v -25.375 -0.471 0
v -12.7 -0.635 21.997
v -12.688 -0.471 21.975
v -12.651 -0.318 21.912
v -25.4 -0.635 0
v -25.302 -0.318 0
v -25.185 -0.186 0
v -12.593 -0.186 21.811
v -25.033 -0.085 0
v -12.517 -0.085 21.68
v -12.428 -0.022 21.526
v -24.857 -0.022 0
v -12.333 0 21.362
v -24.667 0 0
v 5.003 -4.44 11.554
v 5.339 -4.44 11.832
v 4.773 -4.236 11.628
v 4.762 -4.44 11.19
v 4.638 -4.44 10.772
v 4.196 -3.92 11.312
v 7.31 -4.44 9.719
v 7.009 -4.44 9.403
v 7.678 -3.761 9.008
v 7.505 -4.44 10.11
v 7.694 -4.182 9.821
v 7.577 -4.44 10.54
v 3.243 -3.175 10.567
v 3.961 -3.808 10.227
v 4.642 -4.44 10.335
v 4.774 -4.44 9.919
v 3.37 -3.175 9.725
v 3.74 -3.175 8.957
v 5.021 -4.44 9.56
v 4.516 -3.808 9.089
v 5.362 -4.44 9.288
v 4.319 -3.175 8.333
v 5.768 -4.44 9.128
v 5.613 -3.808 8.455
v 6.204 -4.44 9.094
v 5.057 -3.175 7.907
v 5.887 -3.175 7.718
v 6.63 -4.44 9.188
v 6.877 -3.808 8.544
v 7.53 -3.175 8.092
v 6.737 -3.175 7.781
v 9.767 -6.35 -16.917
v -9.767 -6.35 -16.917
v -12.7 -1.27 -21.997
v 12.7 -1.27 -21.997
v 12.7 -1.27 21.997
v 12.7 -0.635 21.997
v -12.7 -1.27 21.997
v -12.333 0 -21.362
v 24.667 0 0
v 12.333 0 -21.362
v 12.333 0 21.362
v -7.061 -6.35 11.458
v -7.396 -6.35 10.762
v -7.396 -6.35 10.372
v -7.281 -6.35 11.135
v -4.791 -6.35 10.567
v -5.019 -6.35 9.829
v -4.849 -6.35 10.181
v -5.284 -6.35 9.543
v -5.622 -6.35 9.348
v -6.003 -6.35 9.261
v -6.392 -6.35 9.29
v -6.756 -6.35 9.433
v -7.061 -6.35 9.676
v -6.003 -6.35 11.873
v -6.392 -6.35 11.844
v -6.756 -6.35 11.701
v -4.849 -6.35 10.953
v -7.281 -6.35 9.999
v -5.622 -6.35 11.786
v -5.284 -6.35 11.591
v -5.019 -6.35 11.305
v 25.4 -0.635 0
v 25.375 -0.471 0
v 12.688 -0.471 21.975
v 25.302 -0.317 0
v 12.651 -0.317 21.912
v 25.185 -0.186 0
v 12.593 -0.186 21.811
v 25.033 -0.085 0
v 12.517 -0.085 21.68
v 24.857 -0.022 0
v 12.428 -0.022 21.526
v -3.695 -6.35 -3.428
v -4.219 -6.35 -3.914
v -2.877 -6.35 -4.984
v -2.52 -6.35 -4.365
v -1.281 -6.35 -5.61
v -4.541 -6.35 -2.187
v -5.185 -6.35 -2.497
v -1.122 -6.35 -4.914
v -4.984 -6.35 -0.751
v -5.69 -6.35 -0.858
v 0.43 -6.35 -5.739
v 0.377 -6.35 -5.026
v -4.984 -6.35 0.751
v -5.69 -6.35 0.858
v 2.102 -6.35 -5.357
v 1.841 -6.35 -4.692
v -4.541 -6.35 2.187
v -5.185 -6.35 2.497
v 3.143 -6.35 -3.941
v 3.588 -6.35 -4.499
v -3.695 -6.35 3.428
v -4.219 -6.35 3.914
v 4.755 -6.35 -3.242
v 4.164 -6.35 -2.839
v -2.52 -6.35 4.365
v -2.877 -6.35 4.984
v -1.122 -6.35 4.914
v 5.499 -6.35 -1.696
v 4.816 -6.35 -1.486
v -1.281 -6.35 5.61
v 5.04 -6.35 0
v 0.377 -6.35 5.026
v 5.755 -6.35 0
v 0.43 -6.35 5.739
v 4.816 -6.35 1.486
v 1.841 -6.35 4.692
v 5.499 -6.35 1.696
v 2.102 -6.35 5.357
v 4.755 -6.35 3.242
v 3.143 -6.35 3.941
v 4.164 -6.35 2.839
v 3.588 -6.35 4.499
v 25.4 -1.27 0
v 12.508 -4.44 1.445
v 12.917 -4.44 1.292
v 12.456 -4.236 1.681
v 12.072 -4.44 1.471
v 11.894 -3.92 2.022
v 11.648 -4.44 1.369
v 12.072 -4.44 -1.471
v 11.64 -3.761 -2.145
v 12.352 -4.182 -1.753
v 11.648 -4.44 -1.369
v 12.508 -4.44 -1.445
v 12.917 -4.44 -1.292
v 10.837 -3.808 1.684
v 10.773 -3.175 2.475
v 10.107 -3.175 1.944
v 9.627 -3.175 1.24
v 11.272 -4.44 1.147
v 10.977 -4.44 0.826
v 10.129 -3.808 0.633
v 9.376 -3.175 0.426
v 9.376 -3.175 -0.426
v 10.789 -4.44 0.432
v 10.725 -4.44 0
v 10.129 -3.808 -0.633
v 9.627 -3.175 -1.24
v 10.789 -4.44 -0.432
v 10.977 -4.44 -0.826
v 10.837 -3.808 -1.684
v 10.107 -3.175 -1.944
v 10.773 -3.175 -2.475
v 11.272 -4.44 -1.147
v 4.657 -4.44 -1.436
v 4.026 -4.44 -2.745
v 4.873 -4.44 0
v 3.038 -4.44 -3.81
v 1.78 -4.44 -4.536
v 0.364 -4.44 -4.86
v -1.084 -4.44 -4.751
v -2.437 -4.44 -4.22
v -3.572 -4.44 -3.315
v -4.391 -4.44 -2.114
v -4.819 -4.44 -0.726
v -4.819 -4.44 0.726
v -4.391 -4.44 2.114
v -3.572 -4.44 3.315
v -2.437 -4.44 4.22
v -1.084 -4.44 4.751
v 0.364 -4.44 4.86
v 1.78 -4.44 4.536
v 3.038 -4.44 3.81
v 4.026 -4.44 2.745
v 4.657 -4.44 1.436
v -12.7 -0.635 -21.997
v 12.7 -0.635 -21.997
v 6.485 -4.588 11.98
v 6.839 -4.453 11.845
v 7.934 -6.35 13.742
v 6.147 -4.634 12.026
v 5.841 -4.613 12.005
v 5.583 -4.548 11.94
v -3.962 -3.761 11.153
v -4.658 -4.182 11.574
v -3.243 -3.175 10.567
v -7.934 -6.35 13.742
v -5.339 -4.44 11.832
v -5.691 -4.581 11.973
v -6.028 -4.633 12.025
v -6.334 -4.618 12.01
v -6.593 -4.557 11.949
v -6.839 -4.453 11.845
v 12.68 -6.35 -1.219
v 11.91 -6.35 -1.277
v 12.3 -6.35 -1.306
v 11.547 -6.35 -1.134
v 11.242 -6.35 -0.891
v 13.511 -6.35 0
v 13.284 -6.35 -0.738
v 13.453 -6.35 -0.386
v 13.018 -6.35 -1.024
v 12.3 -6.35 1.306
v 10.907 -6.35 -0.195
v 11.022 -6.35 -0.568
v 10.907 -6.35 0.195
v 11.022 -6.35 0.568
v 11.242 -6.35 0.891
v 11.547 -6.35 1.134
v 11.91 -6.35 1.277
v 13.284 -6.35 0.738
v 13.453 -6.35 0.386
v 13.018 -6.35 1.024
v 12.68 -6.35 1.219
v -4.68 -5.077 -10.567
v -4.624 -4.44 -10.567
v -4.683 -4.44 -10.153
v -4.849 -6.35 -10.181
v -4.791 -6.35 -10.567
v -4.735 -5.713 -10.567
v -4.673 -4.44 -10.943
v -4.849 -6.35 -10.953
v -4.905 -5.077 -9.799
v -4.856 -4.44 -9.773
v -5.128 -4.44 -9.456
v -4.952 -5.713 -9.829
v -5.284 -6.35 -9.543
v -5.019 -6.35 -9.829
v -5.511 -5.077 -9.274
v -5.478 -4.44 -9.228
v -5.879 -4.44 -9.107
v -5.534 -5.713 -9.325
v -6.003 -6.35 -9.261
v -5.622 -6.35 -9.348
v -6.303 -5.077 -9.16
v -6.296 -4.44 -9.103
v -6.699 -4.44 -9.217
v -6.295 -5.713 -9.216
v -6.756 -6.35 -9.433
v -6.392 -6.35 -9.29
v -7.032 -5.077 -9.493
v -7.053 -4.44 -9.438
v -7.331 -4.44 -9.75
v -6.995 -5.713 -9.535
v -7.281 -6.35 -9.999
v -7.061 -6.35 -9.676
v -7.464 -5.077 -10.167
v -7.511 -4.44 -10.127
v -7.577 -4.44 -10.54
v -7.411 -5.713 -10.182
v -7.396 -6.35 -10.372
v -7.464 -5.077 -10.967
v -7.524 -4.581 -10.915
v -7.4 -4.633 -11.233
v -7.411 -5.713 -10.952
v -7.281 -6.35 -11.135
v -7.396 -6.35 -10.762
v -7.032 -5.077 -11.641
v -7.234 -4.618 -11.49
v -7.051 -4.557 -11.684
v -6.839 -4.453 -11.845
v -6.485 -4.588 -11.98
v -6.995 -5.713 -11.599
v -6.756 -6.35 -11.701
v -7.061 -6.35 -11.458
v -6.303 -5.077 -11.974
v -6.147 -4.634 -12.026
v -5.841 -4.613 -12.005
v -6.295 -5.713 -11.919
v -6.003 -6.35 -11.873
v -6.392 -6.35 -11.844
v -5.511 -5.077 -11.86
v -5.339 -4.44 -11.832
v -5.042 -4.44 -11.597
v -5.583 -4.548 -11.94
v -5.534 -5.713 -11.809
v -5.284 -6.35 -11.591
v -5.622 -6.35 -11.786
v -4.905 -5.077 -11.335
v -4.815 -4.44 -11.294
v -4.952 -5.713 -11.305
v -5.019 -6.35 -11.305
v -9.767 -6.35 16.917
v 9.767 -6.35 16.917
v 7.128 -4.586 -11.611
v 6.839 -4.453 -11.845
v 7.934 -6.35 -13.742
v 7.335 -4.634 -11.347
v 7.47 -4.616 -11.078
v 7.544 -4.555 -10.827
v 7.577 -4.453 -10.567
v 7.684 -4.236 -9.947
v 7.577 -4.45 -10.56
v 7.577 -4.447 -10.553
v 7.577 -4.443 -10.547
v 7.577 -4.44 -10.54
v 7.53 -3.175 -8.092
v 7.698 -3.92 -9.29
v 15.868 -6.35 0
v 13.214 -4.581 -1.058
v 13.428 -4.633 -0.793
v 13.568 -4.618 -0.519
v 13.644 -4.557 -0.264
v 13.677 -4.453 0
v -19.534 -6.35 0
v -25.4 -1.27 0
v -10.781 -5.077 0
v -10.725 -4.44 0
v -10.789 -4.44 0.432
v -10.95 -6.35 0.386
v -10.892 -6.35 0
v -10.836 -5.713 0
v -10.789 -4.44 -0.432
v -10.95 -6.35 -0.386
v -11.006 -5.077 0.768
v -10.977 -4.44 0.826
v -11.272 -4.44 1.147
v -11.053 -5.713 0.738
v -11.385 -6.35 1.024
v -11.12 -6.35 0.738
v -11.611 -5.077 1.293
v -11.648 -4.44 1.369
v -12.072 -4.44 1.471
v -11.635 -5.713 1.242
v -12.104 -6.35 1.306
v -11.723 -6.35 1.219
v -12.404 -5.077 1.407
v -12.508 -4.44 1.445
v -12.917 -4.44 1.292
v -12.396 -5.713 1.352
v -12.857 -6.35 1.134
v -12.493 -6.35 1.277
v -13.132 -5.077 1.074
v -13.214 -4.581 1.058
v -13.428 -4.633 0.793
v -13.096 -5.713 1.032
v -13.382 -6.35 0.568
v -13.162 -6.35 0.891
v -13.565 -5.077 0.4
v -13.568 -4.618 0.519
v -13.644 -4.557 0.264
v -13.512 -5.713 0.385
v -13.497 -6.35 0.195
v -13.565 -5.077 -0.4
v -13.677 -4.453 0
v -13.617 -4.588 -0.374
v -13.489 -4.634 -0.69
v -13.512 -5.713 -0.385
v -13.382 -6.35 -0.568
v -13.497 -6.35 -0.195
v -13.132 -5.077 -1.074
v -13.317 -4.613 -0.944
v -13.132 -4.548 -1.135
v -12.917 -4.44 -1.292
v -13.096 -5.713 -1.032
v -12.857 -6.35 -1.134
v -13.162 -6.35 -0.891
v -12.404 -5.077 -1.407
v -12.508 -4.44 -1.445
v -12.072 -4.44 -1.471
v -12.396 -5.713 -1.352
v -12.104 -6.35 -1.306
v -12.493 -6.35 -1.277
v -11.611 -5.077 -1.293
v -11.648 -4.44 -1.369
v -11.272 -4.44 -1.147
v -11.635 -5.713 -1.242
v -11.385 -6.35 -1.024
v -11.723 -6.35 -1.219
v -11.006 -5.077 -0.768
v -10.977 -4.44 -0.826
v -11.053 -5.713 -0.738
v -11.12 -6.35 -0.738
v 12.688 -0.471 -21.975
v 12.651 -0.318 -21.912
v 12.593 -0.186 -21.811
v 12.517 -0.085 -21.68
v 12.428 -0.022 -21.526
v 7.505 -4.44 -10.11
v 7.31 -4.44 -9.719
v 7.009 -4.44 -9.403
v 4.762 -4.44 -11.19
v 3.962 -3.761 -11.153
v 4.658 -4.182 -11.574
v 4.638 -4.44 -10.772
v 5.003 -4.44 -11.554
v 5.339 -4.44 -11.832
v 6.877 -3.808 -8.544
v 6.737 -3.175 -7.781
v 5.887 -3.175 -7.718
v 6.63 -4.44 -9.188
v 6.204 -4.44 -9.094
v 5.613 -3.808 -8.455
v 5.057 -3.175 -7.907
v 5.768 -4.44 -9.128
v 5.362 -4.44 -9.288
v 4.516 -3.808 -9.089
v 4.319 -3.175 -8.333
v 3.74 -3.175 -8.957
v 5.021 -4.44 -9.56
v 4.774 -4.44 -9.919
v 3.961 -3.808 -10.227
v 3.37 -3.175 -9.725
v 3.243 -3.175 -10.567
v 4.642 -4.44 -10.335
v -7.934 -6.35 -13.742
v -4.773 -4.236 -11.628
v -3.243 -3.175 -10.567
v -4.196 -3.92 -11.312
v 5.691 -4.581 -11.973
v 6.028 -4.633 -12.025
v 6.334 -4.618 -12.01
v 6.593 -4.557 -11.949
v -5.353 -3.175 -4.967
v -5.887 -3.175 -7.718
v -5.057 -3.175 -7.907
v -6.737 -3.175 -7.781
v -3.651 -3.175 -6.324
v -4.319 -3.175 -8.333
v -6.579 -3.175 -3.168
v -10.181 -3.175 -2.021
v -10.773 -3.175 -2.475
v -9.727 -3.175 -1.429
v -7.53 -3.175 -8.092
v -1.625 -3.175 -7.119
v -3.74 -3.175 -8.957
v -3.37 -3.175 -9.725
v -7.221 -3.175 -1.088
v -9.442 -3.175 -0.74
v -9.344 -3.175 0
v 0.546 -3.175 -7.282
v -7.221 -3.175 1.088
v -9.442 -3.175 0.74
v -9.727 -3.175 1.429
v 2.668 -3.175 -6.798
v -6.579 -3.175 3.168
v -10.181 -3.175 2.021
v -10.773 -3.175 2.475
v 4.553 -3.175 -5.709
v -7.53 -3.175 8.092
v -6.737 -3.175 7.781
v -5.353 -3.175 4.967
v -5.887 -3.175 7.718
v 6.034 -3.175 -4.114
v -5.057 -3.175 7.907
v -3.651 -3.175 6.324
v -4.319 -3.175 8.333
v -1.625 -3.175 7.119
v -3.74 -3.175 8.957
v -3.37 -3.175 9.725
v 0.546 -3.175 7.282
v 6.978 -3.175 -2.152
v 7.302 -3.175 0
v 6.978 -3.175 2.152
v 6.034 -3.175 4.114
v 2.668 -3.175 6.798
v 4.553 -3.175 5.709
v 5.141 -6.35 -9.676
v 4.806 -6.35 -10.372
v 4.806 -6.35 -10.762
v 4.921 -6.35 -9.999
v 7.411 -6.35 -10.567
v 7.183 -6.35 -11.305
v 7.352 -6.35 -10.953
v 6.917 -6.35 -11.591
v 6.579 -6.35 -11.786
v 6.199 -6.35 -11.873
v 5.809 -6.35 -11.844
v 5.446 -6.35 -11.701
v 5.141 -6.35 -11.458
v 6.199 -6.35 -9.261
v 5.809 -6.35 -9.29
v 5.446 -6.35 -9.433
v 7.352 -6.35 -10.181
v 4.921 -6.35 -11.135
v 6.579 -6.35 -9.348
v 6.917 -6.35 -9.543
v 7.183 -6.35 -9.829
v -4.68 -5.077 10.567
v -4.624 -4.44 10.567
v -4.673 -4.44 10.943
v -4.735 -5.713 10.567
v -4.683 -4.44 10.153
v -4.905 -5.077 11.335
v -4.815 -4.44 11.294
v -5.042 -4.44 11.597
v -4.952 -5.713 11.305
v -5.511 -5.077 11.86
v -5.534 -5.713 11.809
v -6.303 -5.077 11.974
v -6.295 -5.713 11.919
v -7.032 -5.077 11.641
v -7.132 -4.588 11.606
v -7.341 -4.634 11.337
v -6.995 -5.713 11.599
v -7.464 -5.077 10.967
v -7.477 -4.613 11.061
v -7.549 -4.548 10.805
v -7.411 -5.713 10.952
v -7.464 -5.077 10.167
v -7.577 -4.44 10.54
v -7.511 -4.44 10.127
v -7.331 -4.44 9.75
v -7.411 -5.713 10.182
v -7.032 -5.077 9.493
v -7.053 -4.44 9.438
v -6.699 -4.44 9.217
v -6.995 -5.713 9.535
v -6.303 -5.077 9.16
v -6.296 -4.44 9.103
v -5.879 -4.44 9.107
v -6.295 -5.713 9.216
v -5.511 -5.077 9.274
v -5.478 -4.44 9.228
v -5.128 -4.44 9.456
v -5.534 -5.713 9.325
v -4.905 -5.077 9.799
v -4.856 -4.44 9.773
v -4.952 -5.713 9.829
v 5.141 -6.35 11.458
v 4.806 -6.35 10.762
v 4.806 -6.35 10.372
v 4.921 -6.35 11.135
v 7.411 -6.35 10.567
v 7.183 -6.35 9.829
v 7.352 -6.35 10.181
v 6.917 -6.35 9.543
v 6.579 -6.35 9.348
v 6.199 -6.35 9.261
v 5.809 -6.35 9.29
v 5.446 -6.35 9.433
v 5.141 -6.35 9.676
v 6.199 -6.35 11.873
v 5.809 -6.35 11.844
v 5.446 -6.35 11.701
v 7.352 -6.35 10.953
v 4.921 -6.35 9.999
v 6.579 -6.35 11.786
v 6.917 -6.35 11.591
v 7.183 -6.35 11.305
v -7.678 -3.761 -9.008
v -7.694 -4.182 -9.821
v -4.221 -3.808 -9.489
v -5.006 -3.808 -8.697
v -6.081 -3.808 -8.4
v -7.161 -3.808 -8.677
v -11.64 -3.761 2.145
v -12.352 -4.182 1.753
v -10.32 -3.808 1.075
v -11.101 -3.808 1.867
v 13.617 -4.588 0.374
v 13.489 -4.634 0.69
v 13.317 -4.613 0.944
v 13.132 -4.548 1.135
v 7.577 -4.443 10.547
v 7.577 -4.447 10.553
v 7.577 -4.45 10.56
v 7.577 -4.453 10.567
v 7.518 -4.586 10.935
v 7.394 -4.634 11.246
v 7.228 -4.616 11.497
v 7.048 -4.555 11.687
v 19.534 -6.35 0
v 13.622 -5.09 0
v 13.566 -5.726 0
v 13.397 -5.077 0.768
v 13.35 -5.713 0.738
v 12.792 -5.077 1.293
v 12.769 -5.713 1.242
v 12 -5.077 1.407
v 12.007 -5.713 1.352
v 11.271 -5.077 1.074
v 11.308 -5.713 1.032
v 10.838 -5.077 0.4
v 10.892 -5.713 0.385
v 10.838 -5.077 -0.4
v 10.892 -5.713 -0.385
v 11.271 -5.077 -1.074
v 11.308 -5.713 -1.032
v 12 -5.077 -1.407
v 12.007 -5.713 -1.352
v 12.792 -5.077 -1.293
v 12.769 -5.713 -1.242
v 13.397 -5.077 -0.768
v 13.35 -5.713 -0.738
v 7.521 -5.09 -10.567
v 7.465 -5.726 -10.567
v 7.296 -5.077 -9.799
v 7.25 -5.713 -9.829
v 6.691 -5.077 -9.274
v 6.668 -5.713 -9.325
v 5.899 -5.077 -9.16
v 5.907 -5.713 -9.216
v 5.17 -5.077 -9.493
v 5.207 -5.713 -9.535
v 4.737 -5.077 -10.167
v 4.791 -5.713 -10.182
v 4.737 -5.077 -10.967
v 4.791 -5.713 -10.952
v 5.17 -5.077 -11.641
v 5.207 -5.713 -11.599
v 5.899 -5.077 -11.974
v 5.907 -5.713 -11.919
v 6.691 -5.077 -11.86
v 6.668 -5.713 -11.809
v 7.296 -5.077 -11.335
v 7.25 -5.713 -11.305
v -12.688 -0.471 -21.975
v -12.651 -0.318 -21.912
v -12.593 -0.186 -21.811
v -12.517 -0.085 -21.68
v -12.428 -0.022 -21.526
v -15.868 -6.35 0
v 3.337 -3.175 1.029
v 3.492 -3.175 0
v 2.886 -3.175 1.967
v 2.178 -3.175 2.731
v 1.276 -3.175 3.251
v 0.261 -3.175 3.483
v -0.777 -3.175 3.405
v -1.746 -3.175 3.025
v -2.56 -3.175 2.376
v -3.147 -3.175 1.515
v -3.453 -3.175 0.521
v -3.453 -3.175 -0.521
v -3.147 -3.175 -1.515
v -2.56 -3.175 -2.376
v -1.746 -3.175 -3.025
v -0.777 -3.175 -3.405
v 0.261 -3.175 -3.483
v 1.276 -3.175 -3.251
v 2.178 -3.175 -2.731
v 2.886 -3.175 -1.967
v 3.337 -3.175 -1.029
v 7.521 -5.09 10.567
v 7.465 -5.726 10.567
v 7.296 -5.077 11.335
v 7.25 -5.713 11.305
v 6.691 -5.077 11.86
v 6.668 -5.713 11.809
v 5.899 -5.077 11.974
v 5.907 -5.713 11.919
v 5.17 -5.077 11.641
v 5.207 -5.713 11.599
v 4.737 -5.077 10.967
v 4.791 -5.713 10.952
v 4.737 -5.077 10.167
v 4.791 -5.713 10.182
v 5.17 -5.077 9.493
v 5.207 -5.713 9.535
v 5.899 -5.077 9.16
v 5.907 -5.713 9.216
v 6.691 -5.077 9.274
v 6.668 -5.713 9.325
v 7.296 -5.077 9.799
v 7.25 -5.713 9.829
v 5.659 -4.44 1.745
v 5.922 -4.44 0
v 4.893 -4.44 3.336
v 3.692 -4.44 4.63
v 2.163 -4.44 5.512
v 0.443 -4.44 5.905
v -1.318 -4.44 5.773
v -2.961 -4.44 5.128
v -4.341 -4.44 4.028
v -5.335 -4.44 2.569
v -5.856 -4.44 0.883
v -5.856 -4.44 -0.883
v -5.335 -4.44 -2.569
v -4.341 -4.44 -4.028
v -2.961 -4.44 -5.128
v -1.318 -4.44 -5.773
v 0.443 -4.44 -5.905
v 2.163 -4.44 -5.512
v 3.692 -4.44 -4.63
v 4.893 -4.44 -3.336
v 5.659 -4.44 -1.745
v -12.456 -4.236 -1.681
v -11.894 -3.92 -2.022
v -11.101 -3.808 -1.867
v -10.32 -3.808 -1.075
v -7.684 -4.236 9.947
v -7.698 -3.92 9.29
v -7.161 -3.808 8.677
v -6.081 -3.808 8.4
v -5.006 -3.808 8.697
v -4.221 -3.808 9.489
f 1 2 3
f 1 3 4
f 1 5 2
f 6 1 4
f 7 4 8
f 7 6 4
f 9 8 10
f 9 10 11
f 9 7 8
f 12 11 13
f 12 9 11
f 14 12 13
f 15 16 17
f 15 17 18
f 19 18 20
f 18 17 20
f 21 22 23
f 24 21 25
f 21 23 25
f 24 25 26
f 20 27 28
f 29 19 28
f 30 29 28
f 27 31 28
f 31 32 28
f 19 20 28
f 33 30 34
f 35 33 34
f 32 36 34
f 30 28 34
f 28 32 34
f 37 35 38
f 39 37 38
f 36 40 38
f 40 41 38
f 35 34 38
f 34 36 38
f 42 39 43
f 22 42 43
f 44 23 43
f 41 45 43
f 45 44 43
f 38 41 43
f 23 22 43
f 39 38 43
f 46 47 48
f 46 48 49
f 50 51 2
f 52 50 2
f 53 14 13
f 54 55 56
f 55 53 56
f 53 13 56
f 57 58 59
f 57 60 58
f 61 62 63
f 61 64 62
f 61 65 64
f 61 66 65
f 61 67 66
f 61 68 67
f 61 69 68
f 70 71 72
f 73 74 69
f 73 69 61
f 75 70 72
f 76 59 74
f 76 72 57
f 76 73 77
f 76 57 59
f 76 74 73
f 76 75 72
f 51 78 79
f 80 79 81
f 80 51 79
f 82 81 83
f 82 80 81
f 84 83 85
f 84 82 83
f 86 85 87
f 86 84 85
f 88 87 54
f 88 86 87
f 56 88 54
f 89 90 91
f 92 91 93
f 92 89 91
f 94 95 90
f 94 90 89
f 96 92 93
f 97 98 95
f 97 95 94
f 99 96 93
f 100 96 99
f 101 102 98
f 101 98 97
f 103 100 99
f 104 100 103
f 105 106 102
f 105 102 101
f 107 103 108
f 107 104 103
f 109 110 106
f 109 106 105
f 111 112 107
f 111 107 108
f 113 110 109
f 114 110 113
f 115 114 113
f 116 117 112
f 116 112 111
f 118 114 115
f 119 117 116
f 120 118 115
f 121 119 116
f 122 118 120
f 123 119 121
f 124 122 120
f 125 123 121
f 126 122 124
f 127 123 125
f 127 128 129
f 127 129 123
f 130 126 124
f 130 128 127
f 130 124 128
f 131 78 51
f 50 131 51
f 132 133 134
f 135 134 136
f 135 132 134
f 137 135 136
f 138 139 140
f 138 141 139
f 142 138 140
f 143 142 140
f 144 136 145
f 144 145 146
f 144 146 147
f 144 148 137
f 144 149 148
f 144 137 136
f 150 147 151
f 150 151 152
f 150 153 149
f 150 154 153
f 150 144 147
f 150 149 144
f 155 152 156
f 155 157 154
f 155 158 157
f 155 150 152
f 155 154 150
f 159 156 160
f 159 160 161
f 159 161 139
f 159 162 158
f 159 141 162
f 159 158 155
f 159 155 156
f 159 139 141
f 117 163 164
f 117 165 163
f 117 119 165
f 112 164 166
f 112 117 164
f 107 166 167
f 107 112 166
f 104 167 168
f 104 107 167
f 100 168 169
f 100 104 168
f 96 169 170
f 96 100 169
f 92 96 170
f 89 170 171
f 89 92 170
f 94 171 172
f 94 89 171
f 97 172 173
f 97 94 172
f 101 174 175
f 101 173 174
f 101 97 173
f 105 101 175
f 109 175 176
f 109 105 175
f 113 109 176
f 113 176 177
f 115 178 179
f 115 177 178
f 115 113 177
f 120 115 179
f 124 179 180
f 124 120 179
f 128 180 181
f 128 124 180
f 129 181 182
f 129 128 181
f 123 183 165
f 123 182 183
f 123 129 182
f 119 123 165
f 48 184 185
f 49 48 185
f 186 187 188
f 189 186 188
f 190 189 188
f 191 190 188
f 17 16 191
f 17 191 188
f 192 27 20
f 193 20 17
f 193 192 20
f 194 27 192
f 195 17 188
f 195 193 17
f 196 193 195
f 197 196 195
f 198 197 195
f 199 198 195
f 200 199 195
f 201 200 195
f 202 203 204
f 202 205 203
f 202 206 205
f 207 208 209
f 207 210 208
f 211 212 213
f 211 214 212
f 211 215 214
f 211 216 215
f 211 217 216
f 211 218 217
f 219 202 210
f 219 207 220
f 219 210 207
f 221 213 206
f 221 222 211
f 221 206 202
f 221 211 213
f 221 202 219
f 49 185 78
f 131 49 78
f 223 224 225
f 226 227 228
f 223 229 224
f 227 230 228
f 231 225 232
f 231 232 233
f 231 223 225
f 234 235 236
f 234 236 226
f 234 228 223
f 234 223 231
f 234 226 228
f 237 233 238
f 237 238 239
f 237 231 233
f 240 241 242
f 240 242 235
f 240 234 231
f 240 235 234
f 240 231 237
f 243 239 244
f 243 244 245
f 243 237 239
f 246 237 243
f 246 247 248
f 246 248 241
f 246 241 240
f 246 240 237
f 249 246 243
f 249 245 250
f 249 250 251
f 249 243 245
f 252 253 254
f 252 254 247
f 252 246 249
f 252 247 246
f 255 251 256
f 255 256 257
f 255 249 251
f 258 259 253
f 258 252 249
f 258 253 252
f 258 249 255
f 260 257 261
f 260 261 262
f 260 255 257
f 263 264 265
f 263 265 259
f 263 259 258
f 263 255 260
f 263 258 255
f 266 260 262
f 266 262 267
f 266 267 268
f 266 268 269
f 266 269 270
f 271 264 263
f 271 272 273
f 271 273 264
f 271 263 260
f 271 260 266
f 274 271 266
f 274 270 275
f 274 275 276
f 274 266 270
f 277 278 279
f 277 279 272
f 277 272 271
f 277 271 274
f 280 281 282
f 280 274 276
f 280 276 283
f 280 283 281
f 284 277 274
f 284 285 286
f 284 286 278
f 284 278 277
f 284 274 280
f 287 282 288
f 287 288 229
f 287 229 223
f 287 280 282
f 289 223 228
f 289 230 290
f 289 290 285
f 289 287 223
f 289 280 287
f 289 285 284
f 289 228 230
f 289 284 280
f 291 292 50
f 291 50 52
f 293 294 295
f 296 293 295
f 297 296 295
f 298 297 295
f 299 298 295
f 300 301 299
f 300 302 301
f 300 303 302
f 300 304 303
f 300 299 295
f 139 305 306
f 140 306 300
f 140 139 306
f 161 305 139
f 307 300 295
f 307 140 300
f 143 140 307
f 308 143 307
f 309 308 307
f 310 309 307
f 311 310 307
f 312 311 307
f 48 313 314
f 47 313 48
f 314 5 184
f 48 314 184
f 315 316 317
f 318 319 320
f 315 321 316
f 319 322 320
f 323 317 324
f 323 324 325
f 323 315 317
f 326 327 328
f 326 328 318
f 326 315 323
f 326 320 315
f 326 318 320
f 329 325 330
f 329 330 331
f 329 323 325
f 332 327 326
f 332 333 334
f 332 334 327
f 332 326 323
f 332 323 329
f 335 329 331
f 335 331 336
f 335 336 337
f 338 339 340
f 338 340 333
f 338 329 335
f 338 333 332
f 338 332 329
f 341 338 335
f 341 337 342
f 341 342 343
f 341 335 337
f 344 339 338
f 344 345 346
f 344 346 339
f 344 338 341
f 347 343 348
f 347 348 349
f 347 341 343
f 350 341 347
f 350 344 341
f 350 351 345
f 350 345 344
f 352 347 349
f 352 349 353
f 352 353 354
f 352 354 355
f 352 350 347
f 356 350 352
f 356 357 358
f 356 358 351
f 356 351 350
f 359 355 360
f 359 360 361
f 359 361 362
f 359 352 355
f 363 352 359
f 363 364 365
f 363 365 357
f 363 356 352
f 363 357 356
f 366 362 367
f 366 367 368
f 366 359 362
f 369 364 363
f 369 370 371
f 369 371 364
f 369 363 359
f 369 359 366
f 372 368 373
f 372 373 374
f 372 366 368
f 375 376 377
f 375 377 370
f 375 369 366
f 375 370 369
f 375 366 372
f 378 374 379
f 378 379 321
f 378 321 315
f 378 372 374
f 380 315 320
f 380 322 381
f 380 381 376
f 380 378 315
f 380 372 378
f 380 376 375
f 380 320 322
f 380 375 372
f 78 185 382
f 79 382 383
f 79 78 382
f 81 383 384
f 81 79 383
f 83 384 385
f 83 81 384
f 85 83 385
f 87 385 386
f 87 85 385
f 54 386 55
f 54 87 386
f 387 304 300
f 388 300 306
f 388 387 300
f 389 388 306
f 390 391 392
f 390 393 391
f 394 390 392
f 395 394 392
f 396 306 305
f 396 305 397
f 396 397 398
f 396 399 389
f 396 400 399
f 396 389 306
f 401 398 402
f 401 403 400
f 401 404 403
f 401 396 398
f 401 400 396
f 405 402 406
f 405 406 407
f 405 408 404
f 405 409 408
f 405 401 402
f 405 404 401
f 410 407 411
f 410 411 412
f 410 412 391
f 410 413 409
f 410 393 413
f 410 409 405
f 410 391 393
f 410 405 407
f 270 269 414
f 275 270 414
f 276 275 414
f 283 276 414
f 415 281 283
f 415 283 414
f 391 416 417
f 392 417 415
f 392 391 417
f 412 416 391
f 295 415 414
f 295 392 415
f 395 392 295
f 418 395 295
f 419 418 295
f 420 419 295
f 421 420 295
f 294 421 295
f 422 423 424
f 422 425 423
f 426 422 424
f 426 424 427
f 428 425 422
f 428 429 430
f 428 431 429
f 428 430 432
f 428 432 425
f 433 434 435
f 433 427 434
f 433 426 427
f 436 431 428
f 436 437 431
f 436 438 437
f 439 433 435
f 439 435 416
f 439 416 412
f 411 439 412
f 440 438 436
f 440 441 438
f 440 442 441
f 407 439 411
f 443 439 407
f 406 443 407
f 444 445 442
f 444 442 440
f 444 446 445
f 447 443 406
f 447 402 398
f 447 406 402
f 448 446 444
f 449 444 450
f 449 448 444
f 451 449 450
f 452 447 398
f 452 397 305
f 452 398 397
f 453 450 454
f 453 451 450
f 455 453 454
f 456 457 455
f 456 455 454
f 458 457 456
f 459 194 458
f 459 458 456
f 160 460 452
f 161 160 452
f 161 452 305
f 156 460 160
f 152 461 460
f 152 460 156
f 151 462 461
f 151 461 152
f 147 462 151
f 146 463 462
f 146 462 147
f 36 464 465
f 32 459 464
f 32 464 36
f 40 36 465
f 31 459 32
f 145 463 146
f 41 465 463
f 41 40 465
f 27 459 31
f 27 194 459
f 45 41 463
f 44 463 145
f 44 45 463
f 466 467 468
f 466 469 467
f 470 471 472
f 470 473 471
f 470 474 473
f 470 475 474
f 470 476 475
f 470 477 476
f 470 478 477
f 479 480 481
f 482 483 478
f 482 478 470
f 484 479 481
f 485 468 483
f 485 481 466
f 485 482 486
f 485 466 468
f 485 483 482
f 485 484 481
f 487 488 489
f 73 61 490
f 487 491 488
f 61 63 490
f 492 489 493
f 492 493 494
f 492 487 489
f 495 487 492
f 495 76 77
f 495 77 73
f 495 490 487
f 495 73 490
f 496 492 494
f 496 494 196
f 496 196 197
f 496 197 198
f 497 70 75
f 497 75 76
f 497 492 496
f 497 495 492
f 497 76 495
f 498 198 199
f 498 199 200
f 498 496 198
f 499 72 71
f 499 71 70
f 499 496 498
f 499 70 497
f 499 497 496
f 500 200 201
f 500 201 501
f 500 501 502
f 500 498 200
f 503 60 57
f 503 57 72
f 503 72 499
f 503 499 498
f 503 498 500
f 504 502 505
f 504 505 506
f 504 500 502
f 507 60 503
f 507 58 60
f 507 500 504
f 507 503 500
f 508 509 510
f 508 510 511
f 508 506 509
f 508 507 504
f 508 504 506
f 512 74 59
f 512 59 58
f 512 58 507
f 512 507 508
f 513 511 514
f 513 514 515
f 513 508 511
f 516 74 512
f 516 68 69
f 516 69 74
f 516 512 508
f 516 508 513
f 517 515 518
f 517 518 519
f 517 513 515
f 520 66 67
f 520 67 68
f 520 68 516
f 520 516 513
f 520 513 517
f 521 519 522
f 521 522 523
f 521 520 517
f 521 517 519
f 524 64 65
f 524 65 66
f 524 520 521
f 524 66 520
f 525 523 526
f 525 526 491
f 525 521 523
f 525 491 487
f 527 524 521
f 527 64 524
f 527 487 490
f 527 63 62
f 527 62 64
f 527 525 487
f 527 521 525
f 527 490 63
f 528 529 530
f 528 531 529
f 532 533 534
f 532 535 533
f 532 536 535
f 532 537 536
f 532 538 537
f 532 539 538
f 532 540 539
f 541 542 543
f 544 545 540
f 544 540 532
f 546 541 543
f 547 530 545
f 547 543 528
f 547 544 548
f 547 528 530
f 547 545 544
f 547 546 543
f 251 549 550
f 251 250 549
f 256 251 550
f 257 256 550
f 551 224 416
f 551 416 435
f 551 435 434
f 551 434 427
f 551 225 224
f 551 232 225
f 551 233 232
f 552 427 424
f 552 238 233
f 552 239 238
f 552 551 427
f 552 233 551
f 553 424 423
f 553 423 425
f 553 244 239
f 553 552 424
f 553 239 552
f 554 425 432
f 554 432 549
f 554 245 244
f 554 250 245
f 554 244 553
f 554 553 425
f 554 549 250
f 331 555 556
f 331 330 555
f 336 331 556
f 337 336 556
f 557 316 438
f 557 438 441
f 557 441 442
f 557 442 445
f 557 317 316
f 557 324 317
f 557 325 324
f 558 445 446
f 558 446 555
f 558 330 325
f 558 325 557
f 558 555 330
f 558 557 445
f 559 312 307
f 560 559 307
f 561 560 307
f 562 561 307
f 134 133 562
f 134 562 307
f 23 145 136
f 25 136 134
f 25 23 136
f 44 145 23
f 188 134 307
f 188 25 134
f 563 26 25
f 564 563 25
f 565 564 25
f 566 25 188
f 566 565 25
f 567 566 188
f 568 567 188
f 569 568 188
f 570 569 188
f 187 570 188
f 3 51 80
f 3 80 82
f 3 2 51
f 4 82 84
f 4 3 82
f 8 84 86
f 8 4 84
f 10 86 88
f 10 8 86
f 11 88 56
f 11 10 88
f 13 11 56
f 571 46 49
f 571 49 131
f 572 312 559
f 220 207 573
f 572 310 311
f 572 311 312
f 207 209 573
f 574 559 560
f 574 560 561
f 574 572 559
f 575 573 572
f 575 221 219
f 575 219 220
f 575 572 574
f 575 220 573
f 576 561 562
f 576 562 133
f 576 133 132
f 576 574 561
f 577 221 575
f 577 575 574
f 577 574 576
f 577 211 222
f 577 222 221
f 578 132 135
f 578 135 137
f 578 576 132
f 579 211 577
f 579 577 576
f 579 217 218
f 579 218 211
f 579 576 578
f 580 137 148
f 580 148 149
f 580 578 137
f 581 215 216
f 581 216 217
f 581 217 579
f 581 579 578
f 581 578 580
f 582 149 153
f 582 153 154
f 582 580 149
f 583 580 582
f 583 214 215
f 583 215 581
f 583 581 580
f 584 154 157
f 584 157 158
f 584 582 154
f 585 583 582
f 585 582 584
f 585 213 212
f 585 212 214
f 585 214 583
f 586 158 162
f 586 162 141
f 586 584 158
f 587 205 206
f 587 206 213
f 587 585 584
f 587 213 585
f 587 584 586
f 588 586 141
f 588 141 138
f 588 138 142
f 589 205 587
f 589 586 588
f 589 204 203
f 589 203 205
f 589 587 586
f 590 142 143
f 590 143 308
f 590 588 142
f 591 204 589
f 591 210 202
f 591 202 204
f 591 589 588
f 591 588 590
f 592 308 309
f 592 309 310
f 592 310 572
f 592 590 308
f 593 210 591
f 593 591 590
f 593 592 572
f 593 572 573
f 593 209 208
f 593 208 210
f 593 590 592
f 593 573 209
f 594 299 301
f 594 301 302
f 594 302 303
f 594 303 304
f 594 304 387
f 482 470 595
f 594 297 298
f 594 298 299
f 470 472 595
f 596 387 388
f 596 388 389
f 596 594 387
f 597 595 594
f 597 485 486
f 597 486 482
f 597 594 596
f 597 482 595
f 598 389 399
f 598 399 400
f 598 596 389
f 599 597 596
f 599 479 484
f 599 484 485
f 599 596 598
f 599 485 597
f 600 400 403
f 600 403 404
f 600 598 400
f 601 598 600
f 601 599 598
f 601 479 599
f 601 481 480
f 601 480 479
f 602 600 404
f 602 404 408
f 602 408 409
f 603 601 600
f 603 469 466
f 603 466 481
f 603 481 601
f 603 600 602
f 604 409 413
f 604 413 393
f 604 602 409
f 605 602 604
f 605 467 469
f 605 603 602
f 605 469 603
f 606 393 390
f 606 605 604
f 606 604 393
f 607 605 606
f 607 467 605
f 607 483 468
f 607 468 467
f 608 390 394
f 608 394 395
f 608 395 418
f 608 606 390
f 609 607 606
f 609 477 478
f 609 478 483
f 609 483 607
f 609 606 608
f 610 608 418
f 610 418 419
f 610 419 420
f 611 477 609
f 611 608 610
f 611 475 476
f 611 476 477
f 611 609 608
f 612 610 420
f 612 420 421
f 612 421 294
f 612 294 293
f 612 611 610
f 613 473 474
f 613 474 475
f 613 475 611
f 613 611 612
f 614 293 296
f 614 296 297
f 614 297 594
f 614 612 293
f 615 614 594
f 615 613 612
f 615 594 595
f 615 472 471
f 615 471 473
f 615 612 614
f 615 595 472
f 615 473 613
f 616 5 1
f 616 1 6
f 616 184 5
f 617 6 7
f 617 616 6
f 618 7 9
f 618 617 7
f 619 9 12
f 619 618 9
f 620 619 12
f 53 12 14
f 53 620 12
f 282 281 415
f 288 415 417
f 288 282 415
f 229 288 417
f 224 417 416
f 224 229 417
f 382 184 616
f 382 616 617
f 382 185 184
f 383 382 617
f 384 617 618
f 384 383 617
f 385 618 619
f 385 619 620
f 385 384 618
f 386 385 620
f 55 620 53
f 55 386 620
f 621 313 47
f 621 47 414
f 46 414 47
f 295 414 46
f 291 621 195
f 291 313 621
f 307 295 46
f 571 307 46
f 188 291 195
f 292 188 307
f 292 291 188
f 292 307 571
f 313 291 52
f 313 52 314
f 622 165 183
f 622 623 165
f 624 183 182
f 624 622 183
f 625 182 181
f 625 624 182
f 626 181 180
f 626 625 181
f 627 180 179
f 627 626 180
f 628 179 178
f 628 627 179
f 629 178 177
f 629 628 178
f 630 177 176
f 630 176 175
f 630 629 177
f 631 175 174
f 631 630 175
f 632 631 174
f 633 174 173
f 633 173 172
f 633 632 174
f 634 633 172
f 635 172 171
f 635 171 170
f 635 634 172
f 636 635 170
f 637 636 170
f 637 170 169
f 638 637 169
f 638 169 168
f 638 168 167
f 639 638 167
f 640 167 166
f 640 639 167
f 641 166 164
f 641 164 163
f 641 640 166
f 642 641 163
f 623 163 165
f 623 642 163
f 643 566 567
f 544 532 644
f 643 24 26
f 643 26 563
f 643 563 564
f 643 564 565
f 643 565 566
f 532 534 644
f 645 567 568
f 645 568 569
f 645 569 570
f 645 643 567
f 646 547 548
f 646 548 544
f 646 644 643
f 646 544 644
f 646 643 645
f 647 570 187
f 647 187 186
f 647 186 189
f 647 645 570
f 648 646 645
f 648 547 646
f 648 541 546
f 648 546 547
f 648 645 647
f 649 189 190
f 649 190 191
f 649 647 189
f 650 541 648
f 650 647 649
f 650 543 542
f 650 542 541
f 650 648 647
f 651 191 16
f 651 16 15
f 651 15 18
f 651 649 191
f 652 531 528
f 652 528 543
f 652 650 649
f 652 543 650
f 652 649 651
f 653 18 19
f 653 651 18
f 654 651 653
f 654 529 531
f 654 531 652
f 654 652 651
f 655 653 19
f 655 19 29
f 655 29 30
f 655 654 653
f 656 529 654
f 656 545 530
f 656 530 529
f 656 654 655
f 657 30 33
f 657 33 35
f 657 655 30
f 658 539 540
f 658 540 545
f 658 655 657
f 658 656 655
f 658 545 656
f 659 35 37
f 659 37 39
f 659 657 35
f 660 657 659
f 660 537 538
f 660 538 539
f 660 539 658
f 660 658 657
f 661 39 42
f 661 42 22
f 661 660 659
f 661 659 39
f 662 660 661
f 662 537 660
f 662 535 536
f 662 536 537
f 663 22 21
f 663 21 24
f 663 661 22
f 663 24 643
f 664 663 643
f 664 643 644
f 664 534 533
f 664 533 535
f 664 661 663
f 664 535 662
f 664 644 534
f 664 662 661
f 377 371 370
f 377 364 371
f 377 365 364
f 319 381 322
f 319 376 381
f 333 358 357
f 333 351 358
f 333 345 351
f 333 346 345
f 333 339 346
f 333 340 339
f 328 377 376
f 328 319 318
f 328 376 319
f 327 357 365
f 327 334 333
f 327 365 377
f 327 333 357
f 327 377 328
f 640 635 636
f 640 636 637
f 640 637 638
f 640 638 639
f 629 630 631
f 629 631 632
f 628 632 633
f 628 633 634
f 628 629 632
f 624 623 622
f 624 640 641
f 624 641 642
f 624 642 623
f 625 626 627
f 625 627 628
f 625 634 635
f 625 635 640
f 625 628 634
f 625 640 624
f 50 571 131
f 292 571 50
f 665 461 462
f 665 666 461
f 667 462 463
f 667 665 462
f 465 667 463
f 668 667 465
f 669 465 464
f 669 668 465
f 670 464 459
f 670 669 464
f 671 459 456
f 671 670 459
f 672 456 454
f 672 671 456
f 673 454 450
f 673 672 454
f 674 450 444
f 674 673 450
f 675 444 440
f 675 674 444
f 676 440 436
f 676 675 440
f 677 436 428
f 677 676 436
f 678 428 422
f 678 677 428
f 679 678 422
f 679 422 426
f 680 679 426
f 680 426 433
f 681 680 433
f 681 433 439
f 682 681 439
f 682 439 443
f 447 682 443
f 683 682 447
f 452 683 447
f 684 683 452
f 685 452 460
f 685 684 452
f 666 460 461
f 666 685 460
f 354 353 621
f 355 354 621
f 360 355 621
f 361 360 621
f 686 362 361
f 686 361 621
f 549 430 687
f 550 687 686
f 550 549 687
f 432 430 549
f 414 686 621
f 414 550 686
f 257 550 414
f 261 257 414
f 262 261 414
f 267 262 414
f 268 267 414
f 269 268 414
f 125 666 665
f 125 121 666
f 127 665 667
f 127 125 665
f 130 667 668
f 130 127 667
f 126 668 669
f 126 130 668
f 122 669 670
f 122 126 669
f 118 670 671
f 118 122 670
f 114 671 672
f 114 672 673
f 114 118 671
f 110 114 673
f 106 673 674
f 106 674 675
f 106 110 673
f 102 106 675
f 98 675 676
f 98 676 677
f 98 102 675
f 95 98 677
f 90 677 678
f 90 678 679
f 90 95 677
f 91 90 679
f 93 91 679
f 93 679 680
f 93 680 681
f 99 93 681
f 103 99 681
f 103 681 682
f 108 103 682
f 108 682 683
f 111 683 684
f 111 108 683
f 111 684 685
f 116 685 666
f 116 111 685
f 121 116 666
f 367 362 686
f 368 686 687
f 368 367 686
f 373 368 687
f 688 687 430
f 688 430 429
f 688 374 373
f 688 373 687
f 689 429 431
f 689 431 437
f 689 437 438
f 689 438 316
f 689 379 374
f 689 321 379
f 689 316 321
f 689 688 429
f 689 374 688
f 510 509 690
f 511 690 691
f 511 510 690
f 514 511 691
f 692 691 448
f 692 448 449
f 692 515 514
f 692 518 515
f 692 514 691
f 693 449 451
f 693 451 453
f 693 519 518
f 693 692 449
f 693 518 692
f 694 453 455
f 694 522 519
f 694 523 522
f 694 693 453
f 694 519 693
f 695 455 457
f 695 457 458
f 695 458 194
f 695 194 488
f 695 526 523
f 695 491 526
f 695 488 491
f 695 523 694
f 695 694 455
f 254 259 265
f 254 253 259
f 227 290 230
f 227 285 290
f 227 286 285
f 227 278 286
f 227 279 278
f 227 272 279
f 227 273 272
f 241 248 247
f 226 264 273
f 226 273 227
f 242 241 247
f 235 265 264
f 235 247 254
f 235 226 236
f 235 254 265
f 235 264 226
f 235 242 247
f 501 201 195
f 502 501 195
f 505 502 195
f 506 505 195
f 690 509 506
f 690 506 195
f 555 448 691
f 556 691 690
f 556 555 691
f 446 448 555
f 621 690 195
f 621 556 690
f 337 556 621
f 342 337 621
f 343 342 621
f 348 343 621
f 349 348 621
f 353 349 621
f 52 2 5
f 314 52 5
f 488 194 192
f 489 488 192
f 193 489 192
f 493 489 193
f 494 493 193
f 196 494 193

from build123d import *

# Parameters (mm, degrees)
F1_DEPTH     = 6.35
F2_SIZE      = 5.08
F4_DEPTH     = 3.175
F5_SIZE      = 3.17499
F6_R         = 0.635
F7_R         = 1.5875
F7_R_2       = 6.0325
F7_R_3       = 4.7625
F8_DEPTH     = 3.175
F8_TAPER     = 5
F9_T6_ANGLE  = 356.192567219
F9_T8_ANGLE  = 356.192567219
F9_T10_ANGLE = 238.0962831022
F9_T12_ANGLE = 118.0119864136
F9_T14_ANGLE = 178.0330528129
F9_T16_ANGLE = 178.0330528129
F9_T18_ANGLE = 118.0119864072
F9_T20_ANGLE = 238.0962831022
F9_T22_ANGLE = 356.192567219


# Not quite as in the source:
# - a fillet or chamfer that OpenCascade refuses, or shapes differently, is made with other operations: its cross-section is extruded or revolved along the edge and cut away or added
# - a fillet or chamfer is up to 0.001 mm smaller than in the source, because OpenCascade refuses the exact size


with BuildPart() as f1:
    # F0 (on Front) → F1 (new body)
    with BuildSketch(Plane.XZ):
        Polygon((-12.7, 21.9970452561), (-25.4, 0), (-12.7, -21.9970452561), (12.7, -21.9970452561), (25.4, 0), (12.7, 21.9970452561), align=None)
    extrude(amount=F1_DEPTH)

    # F2
    f2_edges = [f1.edges().sort_by_distance(p)[0] for p in [
        (0, -6.35, -21.997045),
        (19.05, -6.35, -10.998523),
        (19.05, -6.35, 10.998523),
        (0, -6.35, 21.997045),
        (-19.05, -6.35, 10.998523),
        (-19.05, -6.35, -10.998523),
    ]]
    chamfer(f2_edges, length=F2_SIZE)

    # F3 (on face) → F4 (cut)
    with BuildSketch(Plane.XZ.offset(6.35)):
        Polygon((7.9339735278, 13.7420452561), (-7.9339735278, 13.7420452561), (-15.8679470557, 0), (-7.9339735278, -13.7420452561), (7.9339735278, -13.7420452561), (15.8679470557, 0), align=None)
    extrude(amount=-F4_DEPTH, mode=Mode.SUBTRACT)

    # F5 (size 3.175 in the source; OpenCascade refuses exactly that, so slightly less here)
    f5_edges = [f1.edges().sort_by_distance(p)[0] for p in [
        (-11.90096, -3.175, 6.871023),
        (0, -3.175, 13.742045),
        (-11.90096, -3.175, -6.871023),
        (0, -3.175, -13.742045),
        (11.90096, -3.175, -6.871023),
        (11.90096, -3.175, 6.871023),
    ]]
    chamfer(f5_edges, length=F5_SIZE)

    # F6
    f6_edges = [f1.edges().sort_by_distance(p)[0] for p in [
        (19.05, 0, -10.998523),
        (19.05, 0, 10.998523),
        (0, 0, -21.997045),
        (-19.05, 0, -10.998523),
        (-19.05, 0, 10.998523),
        (0, 0, 21.997045),
    ]]
    fillet(f6_edges, radius=F6_R)

    # F7 (on face) → F8 (join)
    with BuildSketch(Plane.XZ.offset(3.175)):
        with Locations((12.2017728463, 0)):
            Circle(F7_R)
        Circle(F7_R_2)
        Circle(F7_R_3, mode=Mode.SUBTRACT)
        with Locations((6.1008864232, 10.5670452561)):
            Circle(F7_R)
        with Locations((-6.1008864232, 10.5670452561)):
            Circle(F7_R)
        with Locations((-12.2017728463, 0)):
            Circle(F7_R)
        with Locations((-6.1008864232, -10.5670452561)):
            Circle(F7_R)
        with Locations((6.1008864232, -10.5670452561)):
            Circle(F7_R)
    extrude(amount=F8_DEPTH, taper=F8_TAPER)

    # F9: chamfer of 1.27 on 11 edges, made by hand

    # F9_s1 → F9_t2 (revolve)
    with BuildSketch(Plane.XY):
        Polygon((4.8731877933, -4.4401672666), (3.4925, -3.175), (4.7625, -3.175), align=None)
    revolve(axis=Axis((0, -3.175, 0), (0, -1, 0)))

    # F9_s3 → F9_t4 (revolve)
    with BuildSketch(Plane.XY):
        Polygon((7.3025, -3.175), (5.9218122067, -4.4401672666), (6.0325, -3.175), align=None)
    revolve(axis=Axis((0, -3.175, 0), (0, -1, 0)))

    # F9_s5 → F9_t6 (revolve)
    with BuildSketch(Plane(origin=(0.0134654957, 0, -0.4051192424), x_dir=(0, 1, 0), z_dir=(0.0332200059, 0, -0.9994480633))):
        Polygon((-3.175, 15.0525382399), (-4.4401672666, 13.6718504466), (-3.175, 13.7825382399), align=None)
    revolve(axis=Axis((12.2017728463, -3.175, 0), (0, -1, 0)), revolution_arc=F9_T6_ANGLE)

    # F9_s7 → F9_t8 (revolve)
    with BuildSketch(Plane(origin=(0.3575763033, 0, -0.1908981598), x_dir=(0, 1, 0), z_dir=(0.8821574155, 0, -0.4709546626))):
        Polygon((-4.4401672666, 13.6718504466), (-3.175, 15.0525382399), (-3.175, 13.7825382399), align=None)
    revolve(axis=Axis((6.1008864232, -3.175, 10.5670452561), (0, -1, 0)), revolution_arc=F9_T8_ANGLE)

    # F9_s9 → F9_t10 (revolve)
    with BuildSketch(Plane(origin=(0.3441108974, 0, 0.2142211427), x_dir=(0, 1, 0), z_dir=(0.8489374049, 0, 0.5284934082))):
        Polygon((-3.175, 15.0525382363), (-4.4401672666, 13.671850443), (-3.175, 13.7825382363), align=None)
    revolve(axis=Axis((-6.1008864232, -3.175, 10.5670452561), (0, -1, 0)), revolution_arc=F9_T10_ANGLE)

    # F9_s11 → F9_t12 (revolve)
    with BuildSketch(Plane.XY.offset(10.5670452561)):
        Polygon((-3.2433864232, -3.175), (-4.6240742165, -4.4401672666), (-4.5133864232, -3.175), align=None)
    revolve(axis=Axis((-6.1008864232, -3.175, 10.5670452561), (0, -1, 0)), revolution_arc=F9_T12_ANGLE)

    # F9_s13 → F9_t14 (revolve)
    with BuildSketch(Plane(origin=(-0.0143744903, 0, 0.4185542247), x_dir=(0, 1, 0), z_dir=(-0.0343229619, 0, 0.9994107936))):
        Polygon((-3.175, 15.0520834832), (-4.4401672666, 13.6713956899), (-3.175, 13.7820834832), align=None)
    revolve(axis=Axis((-12.2017728463, -3.175, 0), (0, -1, 0)), revolution_arc=F9_T14_ANGLE)

    # F9_s15 → F9_t16 (revolve)
    with BuildSketch(Plane.XY):
        Polygon((-9.3442728463, -3.175), (-10.7249606396, -4.4401672666), (-10.6142728463, -3.175), align=None)
    revolve(axis=Axis((-12.2017728463, -3.175, 0), (0, -1, 0)), revolution_arc=F9_T16_ANGLE)

    # F9_s17 → F9_t18 (revolve)
    with BuildSketch(Plane(origin=(-0.3736965716, 0, 0.1987982832), x_dir=(0, 1, 0), z_dir=(-0.882849359, 0, 0.4696562672))):
        Polygon((-3.175, 15.0519286749), (-4.4401672666, 13.6712408817), (-3.175, 13.7819286749), align=None)
    revolve(axis=Axis((-6.1008864232, -3.175, -10.5670452561), (0, -1, 0)), revolution_arc=F9_T18_ANGLE)

    # F9_s19 → F9_t20 (revolve)
    with BuildSketch(Plane.XY.offset(-10.5670452561)):
        Polygon((-3.2433864232, -3.175), (-4.6240742165, -4.4401672666), (-4.5133864232, -3.175), align=None)
    revolve(axis=Axis((-6.1008864232, -3.175, -10.5670452561), (0, -1, 0)), revolution_arc=F9_T20_ANGLE)

    # F9_s21 → F9_t22 (revolve)
    with BuildSketch(Plane(origin=(-0.3441108076, 0, -0.2142210826), x_dir=(0, 1, 0), z_dir=(-0.8489374096, 0, -0.5284934007))):
        Polygon((-3.175, 15.0525382399), (-4.4401672666, 13.6718504466), (-3.175, 13.7825382399), align=None)
    revolve(axis=Axis((6.1008864232, -3.175, -10.5670452561), (0, -1, 0)), revolution_arc=F9_T22_ANGLE)


solid = f1.part
